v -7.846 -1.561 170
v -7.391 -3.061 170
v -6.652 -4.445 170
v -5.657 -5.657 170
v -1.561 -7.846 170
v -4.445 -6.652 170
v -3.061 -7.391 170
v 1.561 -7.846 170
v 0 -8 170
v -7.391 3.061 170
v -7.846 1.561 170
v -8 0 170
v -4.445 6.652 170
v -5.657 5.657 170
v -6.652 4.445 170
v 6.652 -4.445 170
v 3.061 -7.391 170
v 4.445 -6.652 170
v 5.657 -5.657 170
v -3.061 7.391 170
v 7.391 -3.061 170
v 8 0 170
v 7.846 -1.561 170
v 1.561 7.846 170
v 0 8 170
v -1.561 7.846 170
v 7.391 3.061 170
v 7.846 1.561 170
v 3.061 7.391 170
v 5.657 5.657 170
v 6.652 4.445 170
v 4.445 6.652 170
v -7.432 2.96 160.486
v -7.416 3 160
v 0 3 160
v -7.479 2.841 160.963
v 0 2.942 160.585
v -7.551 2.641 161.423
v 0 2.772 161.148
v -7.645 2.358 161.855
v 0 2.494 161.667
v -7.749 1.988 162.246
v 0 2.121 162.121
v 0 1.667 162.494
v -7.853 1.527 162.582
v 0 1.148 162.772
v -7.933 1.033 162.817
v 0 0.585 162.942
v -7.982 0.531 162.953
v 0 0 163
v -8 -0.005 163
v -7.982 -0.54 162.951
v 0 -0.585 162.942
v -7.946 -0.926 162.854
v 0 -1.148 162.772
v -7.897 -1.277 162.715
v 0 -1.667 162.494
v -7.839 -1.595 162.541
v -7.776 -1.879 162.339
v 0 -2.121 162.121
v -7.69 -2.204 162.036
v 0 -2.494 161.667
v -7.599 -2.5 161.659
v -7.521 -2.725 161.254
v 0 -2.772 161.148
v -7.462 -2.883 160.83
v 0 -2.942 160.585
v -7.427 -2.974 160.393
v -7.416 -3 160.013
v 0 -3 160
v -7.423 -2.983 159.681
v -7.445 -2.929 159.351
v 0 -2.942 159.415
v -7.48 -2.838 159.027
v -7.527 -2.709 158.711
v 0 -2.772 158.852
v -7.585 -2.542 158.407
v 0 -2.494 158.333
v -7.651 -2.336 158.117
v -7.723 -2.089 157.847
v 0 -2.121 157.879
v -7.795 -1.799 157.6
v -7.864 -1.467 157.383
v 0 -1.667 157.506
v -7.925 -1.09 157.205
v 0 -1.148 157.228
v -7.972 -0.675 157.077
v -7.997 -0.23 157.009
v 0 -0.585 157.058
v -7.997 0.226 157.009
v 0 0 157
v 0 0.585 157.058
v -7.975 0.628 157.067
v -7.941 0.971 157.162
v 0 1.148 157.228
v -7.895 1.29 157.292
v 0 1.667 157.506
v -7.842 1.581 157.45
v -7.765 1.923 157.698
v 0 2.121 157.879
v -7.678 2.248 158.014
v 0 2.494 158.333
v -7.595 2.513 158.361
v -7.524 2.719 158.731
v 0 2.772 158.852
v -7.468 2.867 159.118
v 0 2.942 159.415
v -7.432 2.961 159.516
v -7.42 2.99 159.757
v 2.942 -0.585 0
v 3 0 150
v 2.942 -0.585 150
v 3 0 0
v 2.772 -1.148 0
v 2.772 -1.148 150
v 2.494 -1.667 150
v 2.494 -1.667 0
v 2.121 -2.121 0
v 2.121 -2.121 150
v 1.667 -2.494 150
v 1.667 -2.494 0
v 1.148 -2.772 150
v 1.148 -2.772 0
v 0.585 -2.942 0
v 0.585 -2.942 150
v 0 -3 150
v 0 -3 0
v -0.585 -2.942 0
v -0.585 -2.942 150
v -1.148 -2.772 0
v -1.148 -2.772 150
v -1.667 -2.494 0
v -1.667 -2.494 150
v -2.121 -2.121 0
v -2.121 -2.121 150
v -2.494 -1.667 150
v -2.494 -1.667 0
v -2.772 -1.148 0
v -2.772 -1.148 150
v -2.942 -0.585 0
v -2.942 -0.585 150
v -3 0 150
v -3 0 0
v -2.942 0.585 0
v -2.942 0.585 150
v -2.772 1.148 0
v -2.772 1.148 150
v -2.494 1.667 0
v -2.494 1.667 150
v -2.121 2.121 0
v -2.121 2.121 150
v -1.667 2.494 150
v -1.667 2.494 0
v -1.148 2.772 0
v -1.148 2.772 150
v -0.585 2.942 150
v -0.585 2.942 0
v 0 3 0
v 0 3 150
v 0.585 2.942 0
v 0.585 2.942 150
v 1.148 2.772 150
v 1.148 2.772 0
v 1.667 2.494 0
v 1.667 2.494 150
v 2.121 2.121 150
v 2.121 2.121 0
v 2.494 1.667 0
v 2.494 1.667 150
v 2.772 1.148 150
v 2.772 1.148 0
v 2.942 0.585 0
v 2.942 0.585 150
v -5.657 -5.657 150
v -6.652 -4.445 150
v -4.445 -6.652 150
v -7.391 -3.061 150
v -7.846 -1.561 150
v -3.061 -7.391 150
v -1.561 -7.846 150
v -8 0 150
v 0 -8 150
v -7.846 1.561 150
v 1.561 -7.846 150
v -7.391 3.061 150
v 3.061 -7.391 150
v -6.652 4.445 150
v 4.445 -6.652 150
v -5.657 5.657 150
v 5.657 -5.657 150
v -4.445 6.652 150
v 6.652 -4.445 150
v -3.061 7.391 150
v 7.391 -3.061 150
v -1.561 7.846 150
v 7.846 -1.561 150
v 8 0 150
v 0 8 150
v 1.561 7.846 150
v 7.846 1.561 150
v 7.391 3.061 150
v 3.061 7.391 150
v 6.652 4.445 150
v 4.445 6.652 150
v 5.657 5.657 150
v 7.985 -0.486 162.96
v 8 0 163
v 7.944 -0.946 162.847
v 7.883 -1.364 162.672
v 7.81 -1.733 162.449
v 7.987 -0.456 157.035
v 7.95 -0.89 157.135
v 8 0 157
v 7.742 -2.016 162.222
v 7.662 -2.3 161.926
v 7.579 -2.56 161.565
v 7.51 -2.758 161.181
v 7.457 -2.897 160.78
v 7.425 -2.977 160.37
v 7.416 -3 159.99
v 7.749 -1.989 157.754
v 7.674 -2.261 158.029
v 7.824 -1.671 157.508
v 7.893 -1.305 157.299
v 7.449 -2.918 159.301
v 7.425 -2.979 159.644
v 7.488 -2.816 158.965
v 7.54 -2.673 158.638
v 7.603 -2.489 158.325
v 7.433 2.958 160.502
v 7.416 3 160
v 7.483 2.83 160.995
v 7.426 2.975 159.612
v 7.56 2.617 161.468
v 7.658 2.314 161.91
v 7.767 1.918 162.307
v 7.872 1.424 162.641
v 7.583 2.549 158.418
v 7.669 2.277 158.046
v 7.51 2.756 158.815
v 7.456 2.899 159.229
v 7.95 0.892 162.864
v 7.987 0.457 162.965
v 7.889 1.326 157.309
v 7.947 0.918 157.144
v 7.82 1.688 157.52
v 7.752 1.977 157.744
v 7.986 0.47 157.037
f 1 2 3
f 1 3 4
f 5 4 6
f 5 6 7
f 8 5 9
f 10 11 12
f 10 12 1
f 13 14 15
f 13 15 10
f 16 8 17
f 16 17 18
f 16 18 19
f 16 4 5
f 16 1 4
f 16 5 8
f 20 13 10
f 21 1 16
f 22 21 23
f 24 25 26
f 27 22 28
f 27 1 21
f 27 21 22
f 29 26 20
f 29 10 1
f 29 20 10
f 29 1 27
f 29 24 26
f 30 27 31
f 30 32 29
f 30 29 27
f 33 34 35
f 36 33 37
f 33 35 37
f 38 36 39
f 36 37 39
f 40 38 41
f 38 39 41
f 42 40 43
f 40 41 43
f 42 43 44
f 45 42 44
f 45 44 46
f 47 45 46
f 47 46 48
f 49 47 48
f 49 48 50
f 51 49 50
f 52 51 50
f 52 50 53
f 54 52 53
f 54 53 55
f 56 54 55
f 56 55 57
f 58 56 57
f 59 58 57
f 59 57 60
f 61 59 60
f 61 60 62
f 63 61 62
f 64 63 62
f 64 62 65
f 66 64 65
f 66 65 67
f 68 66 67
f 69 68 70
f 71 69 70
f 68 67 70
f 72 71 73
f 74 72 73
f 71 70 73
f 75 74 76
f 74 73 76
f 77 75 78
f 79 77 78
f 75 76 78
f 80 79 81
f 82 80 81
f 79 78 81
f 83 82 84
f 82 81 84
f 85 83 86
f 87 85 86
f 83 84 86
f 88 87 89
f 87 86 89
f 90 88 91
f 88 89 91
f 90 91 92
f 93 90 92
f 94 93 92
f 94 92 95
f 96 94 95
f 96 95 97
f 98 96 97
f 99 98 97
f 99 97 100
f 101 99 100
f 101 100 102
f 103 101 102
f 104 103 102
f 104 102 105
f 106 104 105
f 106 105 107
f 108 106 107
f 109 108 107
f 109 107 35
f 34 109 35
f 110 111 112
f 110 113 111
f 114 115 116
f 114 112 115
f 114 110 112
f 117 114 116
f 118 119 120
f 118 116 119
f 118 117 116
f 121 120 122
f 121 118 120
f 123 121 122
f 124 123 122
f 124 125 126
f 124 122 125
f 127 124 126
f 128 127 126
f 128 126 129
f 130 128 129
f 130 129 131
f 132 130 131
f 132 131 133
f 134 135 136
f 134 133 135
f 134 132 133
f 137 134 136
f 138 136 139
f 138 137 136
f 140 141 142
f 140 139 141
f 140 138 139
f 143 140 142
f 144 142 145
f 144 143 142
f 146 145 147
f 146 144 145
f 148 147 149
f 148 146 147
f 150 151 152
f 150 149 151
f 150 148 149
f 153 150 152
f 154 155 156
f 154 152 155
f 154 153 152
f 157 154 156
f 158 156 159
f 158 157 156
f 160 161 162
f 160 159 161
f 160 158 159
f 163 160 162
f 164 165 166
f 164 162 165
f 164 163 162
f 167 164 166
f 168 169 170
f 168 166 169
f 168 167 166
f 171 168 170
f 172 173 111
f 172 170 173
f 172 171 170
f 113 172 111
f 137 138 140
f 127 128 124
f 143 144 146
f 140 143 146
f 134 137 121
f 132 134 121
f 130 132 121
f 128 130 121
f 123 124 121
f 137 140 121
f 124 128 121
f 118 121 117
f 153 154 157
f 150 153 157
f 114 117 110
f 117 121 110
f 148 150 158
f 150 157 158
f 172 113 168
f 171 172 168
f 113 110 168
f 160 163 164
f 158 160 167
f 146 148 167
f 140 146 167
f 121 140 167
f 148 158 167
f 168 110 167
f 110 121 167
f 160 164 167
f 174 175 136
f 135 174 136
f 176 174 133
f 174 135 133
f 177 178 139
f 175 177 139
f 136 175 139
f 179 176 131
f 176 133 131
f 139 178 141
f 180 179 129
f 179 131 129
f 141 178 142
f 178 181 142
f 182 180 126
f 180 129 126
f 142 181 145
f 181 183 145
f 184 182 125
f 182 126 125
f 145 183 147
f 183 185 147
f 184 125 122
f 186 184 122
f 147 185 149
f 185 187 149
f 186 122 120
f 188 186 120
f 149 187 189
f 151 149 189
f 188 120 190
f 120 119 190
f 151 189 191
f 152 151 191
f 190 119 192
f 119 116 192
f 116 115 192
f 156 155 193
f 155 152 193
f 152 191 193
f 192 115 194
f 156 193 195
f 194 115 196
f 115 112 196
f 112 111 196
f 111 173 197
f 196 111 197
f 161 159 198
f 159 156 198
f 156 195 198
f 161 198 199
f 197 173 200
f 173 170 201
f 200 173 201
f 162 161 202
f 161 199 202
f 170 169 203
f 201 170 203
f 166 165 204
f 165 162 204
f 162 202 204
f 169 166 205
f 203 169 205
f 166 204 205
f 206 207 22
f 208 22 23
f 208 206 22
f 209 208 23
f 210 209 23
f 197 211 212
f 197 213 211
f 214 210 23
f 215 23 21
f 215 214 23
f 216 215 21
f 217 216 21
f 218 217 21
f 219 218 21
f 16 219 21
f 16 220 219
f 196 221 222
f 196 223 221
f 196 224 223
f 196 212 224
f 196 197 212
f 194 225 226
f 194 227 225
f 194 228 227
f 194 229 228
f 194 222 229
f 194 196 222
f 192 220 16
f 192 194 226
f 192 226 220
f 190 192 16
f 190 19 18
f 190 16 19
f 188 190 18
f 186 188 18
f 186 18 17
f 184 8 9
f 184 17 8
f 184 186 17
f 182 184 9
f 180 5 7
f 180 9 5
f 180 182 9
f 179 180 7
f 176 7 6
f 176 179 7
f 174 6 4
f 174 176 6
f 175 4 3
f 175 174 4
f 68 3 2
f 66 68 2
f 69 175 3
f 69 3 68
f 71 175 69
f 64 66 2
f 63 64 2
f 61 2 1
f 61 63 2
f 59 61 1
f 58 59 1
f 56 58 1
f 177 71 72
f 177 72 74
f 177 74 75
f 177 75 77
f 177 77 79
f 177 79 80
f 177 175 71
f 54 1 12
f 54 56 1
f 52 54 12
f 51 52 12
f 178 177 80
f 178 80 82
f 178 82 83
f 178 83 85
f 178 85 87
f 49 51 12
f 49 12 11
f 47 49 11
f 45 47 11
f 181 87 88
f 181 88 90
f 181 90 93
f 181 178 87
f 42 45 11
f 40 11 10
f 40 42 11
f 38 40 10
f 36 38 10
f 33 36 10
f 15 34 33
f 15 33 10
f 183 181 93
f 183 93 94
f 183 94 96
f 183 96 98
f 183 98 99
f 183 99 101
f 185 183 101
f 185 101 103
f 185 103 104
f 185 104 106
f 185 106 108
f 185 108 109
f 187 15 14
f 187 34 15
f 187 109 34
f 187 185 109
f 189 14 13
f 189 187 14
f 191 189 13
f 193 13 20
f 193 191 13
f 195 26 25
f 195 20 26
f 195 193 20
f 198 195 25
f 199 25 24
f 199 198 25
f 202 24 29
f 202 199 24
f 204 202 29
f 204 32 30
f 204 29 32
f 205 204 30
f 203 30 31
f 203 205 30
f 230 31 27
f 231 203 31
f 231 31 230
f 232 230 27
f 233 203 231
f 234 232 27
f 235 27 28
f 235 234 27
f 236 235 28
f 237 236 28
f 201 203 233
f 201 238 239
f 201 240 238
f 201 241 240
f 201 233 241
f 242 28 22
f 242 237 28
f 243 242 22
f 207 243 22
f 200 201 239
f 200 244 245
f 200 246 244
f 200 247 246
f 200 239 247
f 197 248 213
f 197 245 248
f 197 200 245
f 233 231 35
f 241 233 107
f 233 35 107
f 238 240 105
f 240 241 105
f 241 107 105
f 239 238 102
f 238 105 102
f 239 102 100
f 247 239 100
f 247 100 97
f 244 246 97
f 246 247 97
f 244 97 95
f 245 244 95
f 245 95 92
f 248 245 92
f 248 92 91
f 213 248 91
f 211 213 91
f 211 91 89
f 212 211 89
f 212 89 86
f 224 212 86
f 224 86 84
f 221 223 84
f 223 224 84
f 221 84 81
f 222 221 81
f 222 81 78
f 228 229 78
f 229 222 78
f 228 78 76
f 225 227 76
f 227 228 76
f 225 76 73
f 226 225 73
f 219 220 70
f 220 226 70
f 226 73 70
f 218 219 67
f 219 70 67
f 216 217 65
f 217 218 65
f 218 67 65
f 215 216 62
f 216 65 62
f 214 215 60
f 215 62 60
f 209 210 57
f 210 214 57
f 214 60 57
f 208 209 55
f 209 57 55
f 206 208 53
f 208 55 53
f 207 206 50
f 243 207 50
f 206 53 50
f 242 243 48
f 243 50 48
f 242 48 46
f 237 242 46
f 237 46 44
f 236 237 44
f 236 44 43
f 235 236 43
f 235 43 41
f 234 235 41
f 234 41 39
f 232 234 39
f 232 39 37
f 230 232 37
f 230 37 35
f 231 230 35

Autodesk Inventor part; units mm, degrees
ref_plane "YZ Plane" through (0, 0, 0) normal (1, 0, 0) x (0, 1, 0)
ref_plane "XZ Plane" through (0, 0, 0) normal (0, 1, 0) x (-1, 0, 0)
ref_plane "XY Plane" through (0, 0, 0) normal (0, 0, 1) x (1, 0, 0)
sketch "Sketch1" plane through (0, 0, 0) normal (0, 0, 1) x (1, 0, 0)
  circle A0 centre (0, 0) radius 3
  dimension "d0" = 6
extrude "Extrusion1" add sketch "Sketch1" along normal blind 150
sketch "Sketch2" plane through (0, 0, 150) normal (0, 0, 1) x (1, 0, 0)
  circle A0 centre (0, 0) radius 8
  dimension "d3" = 16
extrude "Extrusion2" add sketch "Sketch2" along normal blind 20
sketch "Sketch3" plane through (0, 0, 0) normal (1, 0, 0) x (0, 1, 0)
  circle A0 centre (0, 160) radius 3
  point P0 (0, 0)
  dimension "d6" = 6
extrude "Extrusion3" cut sketch "Sketch3" along normal mid plane 20
properties part number "ana_vida_mili"
